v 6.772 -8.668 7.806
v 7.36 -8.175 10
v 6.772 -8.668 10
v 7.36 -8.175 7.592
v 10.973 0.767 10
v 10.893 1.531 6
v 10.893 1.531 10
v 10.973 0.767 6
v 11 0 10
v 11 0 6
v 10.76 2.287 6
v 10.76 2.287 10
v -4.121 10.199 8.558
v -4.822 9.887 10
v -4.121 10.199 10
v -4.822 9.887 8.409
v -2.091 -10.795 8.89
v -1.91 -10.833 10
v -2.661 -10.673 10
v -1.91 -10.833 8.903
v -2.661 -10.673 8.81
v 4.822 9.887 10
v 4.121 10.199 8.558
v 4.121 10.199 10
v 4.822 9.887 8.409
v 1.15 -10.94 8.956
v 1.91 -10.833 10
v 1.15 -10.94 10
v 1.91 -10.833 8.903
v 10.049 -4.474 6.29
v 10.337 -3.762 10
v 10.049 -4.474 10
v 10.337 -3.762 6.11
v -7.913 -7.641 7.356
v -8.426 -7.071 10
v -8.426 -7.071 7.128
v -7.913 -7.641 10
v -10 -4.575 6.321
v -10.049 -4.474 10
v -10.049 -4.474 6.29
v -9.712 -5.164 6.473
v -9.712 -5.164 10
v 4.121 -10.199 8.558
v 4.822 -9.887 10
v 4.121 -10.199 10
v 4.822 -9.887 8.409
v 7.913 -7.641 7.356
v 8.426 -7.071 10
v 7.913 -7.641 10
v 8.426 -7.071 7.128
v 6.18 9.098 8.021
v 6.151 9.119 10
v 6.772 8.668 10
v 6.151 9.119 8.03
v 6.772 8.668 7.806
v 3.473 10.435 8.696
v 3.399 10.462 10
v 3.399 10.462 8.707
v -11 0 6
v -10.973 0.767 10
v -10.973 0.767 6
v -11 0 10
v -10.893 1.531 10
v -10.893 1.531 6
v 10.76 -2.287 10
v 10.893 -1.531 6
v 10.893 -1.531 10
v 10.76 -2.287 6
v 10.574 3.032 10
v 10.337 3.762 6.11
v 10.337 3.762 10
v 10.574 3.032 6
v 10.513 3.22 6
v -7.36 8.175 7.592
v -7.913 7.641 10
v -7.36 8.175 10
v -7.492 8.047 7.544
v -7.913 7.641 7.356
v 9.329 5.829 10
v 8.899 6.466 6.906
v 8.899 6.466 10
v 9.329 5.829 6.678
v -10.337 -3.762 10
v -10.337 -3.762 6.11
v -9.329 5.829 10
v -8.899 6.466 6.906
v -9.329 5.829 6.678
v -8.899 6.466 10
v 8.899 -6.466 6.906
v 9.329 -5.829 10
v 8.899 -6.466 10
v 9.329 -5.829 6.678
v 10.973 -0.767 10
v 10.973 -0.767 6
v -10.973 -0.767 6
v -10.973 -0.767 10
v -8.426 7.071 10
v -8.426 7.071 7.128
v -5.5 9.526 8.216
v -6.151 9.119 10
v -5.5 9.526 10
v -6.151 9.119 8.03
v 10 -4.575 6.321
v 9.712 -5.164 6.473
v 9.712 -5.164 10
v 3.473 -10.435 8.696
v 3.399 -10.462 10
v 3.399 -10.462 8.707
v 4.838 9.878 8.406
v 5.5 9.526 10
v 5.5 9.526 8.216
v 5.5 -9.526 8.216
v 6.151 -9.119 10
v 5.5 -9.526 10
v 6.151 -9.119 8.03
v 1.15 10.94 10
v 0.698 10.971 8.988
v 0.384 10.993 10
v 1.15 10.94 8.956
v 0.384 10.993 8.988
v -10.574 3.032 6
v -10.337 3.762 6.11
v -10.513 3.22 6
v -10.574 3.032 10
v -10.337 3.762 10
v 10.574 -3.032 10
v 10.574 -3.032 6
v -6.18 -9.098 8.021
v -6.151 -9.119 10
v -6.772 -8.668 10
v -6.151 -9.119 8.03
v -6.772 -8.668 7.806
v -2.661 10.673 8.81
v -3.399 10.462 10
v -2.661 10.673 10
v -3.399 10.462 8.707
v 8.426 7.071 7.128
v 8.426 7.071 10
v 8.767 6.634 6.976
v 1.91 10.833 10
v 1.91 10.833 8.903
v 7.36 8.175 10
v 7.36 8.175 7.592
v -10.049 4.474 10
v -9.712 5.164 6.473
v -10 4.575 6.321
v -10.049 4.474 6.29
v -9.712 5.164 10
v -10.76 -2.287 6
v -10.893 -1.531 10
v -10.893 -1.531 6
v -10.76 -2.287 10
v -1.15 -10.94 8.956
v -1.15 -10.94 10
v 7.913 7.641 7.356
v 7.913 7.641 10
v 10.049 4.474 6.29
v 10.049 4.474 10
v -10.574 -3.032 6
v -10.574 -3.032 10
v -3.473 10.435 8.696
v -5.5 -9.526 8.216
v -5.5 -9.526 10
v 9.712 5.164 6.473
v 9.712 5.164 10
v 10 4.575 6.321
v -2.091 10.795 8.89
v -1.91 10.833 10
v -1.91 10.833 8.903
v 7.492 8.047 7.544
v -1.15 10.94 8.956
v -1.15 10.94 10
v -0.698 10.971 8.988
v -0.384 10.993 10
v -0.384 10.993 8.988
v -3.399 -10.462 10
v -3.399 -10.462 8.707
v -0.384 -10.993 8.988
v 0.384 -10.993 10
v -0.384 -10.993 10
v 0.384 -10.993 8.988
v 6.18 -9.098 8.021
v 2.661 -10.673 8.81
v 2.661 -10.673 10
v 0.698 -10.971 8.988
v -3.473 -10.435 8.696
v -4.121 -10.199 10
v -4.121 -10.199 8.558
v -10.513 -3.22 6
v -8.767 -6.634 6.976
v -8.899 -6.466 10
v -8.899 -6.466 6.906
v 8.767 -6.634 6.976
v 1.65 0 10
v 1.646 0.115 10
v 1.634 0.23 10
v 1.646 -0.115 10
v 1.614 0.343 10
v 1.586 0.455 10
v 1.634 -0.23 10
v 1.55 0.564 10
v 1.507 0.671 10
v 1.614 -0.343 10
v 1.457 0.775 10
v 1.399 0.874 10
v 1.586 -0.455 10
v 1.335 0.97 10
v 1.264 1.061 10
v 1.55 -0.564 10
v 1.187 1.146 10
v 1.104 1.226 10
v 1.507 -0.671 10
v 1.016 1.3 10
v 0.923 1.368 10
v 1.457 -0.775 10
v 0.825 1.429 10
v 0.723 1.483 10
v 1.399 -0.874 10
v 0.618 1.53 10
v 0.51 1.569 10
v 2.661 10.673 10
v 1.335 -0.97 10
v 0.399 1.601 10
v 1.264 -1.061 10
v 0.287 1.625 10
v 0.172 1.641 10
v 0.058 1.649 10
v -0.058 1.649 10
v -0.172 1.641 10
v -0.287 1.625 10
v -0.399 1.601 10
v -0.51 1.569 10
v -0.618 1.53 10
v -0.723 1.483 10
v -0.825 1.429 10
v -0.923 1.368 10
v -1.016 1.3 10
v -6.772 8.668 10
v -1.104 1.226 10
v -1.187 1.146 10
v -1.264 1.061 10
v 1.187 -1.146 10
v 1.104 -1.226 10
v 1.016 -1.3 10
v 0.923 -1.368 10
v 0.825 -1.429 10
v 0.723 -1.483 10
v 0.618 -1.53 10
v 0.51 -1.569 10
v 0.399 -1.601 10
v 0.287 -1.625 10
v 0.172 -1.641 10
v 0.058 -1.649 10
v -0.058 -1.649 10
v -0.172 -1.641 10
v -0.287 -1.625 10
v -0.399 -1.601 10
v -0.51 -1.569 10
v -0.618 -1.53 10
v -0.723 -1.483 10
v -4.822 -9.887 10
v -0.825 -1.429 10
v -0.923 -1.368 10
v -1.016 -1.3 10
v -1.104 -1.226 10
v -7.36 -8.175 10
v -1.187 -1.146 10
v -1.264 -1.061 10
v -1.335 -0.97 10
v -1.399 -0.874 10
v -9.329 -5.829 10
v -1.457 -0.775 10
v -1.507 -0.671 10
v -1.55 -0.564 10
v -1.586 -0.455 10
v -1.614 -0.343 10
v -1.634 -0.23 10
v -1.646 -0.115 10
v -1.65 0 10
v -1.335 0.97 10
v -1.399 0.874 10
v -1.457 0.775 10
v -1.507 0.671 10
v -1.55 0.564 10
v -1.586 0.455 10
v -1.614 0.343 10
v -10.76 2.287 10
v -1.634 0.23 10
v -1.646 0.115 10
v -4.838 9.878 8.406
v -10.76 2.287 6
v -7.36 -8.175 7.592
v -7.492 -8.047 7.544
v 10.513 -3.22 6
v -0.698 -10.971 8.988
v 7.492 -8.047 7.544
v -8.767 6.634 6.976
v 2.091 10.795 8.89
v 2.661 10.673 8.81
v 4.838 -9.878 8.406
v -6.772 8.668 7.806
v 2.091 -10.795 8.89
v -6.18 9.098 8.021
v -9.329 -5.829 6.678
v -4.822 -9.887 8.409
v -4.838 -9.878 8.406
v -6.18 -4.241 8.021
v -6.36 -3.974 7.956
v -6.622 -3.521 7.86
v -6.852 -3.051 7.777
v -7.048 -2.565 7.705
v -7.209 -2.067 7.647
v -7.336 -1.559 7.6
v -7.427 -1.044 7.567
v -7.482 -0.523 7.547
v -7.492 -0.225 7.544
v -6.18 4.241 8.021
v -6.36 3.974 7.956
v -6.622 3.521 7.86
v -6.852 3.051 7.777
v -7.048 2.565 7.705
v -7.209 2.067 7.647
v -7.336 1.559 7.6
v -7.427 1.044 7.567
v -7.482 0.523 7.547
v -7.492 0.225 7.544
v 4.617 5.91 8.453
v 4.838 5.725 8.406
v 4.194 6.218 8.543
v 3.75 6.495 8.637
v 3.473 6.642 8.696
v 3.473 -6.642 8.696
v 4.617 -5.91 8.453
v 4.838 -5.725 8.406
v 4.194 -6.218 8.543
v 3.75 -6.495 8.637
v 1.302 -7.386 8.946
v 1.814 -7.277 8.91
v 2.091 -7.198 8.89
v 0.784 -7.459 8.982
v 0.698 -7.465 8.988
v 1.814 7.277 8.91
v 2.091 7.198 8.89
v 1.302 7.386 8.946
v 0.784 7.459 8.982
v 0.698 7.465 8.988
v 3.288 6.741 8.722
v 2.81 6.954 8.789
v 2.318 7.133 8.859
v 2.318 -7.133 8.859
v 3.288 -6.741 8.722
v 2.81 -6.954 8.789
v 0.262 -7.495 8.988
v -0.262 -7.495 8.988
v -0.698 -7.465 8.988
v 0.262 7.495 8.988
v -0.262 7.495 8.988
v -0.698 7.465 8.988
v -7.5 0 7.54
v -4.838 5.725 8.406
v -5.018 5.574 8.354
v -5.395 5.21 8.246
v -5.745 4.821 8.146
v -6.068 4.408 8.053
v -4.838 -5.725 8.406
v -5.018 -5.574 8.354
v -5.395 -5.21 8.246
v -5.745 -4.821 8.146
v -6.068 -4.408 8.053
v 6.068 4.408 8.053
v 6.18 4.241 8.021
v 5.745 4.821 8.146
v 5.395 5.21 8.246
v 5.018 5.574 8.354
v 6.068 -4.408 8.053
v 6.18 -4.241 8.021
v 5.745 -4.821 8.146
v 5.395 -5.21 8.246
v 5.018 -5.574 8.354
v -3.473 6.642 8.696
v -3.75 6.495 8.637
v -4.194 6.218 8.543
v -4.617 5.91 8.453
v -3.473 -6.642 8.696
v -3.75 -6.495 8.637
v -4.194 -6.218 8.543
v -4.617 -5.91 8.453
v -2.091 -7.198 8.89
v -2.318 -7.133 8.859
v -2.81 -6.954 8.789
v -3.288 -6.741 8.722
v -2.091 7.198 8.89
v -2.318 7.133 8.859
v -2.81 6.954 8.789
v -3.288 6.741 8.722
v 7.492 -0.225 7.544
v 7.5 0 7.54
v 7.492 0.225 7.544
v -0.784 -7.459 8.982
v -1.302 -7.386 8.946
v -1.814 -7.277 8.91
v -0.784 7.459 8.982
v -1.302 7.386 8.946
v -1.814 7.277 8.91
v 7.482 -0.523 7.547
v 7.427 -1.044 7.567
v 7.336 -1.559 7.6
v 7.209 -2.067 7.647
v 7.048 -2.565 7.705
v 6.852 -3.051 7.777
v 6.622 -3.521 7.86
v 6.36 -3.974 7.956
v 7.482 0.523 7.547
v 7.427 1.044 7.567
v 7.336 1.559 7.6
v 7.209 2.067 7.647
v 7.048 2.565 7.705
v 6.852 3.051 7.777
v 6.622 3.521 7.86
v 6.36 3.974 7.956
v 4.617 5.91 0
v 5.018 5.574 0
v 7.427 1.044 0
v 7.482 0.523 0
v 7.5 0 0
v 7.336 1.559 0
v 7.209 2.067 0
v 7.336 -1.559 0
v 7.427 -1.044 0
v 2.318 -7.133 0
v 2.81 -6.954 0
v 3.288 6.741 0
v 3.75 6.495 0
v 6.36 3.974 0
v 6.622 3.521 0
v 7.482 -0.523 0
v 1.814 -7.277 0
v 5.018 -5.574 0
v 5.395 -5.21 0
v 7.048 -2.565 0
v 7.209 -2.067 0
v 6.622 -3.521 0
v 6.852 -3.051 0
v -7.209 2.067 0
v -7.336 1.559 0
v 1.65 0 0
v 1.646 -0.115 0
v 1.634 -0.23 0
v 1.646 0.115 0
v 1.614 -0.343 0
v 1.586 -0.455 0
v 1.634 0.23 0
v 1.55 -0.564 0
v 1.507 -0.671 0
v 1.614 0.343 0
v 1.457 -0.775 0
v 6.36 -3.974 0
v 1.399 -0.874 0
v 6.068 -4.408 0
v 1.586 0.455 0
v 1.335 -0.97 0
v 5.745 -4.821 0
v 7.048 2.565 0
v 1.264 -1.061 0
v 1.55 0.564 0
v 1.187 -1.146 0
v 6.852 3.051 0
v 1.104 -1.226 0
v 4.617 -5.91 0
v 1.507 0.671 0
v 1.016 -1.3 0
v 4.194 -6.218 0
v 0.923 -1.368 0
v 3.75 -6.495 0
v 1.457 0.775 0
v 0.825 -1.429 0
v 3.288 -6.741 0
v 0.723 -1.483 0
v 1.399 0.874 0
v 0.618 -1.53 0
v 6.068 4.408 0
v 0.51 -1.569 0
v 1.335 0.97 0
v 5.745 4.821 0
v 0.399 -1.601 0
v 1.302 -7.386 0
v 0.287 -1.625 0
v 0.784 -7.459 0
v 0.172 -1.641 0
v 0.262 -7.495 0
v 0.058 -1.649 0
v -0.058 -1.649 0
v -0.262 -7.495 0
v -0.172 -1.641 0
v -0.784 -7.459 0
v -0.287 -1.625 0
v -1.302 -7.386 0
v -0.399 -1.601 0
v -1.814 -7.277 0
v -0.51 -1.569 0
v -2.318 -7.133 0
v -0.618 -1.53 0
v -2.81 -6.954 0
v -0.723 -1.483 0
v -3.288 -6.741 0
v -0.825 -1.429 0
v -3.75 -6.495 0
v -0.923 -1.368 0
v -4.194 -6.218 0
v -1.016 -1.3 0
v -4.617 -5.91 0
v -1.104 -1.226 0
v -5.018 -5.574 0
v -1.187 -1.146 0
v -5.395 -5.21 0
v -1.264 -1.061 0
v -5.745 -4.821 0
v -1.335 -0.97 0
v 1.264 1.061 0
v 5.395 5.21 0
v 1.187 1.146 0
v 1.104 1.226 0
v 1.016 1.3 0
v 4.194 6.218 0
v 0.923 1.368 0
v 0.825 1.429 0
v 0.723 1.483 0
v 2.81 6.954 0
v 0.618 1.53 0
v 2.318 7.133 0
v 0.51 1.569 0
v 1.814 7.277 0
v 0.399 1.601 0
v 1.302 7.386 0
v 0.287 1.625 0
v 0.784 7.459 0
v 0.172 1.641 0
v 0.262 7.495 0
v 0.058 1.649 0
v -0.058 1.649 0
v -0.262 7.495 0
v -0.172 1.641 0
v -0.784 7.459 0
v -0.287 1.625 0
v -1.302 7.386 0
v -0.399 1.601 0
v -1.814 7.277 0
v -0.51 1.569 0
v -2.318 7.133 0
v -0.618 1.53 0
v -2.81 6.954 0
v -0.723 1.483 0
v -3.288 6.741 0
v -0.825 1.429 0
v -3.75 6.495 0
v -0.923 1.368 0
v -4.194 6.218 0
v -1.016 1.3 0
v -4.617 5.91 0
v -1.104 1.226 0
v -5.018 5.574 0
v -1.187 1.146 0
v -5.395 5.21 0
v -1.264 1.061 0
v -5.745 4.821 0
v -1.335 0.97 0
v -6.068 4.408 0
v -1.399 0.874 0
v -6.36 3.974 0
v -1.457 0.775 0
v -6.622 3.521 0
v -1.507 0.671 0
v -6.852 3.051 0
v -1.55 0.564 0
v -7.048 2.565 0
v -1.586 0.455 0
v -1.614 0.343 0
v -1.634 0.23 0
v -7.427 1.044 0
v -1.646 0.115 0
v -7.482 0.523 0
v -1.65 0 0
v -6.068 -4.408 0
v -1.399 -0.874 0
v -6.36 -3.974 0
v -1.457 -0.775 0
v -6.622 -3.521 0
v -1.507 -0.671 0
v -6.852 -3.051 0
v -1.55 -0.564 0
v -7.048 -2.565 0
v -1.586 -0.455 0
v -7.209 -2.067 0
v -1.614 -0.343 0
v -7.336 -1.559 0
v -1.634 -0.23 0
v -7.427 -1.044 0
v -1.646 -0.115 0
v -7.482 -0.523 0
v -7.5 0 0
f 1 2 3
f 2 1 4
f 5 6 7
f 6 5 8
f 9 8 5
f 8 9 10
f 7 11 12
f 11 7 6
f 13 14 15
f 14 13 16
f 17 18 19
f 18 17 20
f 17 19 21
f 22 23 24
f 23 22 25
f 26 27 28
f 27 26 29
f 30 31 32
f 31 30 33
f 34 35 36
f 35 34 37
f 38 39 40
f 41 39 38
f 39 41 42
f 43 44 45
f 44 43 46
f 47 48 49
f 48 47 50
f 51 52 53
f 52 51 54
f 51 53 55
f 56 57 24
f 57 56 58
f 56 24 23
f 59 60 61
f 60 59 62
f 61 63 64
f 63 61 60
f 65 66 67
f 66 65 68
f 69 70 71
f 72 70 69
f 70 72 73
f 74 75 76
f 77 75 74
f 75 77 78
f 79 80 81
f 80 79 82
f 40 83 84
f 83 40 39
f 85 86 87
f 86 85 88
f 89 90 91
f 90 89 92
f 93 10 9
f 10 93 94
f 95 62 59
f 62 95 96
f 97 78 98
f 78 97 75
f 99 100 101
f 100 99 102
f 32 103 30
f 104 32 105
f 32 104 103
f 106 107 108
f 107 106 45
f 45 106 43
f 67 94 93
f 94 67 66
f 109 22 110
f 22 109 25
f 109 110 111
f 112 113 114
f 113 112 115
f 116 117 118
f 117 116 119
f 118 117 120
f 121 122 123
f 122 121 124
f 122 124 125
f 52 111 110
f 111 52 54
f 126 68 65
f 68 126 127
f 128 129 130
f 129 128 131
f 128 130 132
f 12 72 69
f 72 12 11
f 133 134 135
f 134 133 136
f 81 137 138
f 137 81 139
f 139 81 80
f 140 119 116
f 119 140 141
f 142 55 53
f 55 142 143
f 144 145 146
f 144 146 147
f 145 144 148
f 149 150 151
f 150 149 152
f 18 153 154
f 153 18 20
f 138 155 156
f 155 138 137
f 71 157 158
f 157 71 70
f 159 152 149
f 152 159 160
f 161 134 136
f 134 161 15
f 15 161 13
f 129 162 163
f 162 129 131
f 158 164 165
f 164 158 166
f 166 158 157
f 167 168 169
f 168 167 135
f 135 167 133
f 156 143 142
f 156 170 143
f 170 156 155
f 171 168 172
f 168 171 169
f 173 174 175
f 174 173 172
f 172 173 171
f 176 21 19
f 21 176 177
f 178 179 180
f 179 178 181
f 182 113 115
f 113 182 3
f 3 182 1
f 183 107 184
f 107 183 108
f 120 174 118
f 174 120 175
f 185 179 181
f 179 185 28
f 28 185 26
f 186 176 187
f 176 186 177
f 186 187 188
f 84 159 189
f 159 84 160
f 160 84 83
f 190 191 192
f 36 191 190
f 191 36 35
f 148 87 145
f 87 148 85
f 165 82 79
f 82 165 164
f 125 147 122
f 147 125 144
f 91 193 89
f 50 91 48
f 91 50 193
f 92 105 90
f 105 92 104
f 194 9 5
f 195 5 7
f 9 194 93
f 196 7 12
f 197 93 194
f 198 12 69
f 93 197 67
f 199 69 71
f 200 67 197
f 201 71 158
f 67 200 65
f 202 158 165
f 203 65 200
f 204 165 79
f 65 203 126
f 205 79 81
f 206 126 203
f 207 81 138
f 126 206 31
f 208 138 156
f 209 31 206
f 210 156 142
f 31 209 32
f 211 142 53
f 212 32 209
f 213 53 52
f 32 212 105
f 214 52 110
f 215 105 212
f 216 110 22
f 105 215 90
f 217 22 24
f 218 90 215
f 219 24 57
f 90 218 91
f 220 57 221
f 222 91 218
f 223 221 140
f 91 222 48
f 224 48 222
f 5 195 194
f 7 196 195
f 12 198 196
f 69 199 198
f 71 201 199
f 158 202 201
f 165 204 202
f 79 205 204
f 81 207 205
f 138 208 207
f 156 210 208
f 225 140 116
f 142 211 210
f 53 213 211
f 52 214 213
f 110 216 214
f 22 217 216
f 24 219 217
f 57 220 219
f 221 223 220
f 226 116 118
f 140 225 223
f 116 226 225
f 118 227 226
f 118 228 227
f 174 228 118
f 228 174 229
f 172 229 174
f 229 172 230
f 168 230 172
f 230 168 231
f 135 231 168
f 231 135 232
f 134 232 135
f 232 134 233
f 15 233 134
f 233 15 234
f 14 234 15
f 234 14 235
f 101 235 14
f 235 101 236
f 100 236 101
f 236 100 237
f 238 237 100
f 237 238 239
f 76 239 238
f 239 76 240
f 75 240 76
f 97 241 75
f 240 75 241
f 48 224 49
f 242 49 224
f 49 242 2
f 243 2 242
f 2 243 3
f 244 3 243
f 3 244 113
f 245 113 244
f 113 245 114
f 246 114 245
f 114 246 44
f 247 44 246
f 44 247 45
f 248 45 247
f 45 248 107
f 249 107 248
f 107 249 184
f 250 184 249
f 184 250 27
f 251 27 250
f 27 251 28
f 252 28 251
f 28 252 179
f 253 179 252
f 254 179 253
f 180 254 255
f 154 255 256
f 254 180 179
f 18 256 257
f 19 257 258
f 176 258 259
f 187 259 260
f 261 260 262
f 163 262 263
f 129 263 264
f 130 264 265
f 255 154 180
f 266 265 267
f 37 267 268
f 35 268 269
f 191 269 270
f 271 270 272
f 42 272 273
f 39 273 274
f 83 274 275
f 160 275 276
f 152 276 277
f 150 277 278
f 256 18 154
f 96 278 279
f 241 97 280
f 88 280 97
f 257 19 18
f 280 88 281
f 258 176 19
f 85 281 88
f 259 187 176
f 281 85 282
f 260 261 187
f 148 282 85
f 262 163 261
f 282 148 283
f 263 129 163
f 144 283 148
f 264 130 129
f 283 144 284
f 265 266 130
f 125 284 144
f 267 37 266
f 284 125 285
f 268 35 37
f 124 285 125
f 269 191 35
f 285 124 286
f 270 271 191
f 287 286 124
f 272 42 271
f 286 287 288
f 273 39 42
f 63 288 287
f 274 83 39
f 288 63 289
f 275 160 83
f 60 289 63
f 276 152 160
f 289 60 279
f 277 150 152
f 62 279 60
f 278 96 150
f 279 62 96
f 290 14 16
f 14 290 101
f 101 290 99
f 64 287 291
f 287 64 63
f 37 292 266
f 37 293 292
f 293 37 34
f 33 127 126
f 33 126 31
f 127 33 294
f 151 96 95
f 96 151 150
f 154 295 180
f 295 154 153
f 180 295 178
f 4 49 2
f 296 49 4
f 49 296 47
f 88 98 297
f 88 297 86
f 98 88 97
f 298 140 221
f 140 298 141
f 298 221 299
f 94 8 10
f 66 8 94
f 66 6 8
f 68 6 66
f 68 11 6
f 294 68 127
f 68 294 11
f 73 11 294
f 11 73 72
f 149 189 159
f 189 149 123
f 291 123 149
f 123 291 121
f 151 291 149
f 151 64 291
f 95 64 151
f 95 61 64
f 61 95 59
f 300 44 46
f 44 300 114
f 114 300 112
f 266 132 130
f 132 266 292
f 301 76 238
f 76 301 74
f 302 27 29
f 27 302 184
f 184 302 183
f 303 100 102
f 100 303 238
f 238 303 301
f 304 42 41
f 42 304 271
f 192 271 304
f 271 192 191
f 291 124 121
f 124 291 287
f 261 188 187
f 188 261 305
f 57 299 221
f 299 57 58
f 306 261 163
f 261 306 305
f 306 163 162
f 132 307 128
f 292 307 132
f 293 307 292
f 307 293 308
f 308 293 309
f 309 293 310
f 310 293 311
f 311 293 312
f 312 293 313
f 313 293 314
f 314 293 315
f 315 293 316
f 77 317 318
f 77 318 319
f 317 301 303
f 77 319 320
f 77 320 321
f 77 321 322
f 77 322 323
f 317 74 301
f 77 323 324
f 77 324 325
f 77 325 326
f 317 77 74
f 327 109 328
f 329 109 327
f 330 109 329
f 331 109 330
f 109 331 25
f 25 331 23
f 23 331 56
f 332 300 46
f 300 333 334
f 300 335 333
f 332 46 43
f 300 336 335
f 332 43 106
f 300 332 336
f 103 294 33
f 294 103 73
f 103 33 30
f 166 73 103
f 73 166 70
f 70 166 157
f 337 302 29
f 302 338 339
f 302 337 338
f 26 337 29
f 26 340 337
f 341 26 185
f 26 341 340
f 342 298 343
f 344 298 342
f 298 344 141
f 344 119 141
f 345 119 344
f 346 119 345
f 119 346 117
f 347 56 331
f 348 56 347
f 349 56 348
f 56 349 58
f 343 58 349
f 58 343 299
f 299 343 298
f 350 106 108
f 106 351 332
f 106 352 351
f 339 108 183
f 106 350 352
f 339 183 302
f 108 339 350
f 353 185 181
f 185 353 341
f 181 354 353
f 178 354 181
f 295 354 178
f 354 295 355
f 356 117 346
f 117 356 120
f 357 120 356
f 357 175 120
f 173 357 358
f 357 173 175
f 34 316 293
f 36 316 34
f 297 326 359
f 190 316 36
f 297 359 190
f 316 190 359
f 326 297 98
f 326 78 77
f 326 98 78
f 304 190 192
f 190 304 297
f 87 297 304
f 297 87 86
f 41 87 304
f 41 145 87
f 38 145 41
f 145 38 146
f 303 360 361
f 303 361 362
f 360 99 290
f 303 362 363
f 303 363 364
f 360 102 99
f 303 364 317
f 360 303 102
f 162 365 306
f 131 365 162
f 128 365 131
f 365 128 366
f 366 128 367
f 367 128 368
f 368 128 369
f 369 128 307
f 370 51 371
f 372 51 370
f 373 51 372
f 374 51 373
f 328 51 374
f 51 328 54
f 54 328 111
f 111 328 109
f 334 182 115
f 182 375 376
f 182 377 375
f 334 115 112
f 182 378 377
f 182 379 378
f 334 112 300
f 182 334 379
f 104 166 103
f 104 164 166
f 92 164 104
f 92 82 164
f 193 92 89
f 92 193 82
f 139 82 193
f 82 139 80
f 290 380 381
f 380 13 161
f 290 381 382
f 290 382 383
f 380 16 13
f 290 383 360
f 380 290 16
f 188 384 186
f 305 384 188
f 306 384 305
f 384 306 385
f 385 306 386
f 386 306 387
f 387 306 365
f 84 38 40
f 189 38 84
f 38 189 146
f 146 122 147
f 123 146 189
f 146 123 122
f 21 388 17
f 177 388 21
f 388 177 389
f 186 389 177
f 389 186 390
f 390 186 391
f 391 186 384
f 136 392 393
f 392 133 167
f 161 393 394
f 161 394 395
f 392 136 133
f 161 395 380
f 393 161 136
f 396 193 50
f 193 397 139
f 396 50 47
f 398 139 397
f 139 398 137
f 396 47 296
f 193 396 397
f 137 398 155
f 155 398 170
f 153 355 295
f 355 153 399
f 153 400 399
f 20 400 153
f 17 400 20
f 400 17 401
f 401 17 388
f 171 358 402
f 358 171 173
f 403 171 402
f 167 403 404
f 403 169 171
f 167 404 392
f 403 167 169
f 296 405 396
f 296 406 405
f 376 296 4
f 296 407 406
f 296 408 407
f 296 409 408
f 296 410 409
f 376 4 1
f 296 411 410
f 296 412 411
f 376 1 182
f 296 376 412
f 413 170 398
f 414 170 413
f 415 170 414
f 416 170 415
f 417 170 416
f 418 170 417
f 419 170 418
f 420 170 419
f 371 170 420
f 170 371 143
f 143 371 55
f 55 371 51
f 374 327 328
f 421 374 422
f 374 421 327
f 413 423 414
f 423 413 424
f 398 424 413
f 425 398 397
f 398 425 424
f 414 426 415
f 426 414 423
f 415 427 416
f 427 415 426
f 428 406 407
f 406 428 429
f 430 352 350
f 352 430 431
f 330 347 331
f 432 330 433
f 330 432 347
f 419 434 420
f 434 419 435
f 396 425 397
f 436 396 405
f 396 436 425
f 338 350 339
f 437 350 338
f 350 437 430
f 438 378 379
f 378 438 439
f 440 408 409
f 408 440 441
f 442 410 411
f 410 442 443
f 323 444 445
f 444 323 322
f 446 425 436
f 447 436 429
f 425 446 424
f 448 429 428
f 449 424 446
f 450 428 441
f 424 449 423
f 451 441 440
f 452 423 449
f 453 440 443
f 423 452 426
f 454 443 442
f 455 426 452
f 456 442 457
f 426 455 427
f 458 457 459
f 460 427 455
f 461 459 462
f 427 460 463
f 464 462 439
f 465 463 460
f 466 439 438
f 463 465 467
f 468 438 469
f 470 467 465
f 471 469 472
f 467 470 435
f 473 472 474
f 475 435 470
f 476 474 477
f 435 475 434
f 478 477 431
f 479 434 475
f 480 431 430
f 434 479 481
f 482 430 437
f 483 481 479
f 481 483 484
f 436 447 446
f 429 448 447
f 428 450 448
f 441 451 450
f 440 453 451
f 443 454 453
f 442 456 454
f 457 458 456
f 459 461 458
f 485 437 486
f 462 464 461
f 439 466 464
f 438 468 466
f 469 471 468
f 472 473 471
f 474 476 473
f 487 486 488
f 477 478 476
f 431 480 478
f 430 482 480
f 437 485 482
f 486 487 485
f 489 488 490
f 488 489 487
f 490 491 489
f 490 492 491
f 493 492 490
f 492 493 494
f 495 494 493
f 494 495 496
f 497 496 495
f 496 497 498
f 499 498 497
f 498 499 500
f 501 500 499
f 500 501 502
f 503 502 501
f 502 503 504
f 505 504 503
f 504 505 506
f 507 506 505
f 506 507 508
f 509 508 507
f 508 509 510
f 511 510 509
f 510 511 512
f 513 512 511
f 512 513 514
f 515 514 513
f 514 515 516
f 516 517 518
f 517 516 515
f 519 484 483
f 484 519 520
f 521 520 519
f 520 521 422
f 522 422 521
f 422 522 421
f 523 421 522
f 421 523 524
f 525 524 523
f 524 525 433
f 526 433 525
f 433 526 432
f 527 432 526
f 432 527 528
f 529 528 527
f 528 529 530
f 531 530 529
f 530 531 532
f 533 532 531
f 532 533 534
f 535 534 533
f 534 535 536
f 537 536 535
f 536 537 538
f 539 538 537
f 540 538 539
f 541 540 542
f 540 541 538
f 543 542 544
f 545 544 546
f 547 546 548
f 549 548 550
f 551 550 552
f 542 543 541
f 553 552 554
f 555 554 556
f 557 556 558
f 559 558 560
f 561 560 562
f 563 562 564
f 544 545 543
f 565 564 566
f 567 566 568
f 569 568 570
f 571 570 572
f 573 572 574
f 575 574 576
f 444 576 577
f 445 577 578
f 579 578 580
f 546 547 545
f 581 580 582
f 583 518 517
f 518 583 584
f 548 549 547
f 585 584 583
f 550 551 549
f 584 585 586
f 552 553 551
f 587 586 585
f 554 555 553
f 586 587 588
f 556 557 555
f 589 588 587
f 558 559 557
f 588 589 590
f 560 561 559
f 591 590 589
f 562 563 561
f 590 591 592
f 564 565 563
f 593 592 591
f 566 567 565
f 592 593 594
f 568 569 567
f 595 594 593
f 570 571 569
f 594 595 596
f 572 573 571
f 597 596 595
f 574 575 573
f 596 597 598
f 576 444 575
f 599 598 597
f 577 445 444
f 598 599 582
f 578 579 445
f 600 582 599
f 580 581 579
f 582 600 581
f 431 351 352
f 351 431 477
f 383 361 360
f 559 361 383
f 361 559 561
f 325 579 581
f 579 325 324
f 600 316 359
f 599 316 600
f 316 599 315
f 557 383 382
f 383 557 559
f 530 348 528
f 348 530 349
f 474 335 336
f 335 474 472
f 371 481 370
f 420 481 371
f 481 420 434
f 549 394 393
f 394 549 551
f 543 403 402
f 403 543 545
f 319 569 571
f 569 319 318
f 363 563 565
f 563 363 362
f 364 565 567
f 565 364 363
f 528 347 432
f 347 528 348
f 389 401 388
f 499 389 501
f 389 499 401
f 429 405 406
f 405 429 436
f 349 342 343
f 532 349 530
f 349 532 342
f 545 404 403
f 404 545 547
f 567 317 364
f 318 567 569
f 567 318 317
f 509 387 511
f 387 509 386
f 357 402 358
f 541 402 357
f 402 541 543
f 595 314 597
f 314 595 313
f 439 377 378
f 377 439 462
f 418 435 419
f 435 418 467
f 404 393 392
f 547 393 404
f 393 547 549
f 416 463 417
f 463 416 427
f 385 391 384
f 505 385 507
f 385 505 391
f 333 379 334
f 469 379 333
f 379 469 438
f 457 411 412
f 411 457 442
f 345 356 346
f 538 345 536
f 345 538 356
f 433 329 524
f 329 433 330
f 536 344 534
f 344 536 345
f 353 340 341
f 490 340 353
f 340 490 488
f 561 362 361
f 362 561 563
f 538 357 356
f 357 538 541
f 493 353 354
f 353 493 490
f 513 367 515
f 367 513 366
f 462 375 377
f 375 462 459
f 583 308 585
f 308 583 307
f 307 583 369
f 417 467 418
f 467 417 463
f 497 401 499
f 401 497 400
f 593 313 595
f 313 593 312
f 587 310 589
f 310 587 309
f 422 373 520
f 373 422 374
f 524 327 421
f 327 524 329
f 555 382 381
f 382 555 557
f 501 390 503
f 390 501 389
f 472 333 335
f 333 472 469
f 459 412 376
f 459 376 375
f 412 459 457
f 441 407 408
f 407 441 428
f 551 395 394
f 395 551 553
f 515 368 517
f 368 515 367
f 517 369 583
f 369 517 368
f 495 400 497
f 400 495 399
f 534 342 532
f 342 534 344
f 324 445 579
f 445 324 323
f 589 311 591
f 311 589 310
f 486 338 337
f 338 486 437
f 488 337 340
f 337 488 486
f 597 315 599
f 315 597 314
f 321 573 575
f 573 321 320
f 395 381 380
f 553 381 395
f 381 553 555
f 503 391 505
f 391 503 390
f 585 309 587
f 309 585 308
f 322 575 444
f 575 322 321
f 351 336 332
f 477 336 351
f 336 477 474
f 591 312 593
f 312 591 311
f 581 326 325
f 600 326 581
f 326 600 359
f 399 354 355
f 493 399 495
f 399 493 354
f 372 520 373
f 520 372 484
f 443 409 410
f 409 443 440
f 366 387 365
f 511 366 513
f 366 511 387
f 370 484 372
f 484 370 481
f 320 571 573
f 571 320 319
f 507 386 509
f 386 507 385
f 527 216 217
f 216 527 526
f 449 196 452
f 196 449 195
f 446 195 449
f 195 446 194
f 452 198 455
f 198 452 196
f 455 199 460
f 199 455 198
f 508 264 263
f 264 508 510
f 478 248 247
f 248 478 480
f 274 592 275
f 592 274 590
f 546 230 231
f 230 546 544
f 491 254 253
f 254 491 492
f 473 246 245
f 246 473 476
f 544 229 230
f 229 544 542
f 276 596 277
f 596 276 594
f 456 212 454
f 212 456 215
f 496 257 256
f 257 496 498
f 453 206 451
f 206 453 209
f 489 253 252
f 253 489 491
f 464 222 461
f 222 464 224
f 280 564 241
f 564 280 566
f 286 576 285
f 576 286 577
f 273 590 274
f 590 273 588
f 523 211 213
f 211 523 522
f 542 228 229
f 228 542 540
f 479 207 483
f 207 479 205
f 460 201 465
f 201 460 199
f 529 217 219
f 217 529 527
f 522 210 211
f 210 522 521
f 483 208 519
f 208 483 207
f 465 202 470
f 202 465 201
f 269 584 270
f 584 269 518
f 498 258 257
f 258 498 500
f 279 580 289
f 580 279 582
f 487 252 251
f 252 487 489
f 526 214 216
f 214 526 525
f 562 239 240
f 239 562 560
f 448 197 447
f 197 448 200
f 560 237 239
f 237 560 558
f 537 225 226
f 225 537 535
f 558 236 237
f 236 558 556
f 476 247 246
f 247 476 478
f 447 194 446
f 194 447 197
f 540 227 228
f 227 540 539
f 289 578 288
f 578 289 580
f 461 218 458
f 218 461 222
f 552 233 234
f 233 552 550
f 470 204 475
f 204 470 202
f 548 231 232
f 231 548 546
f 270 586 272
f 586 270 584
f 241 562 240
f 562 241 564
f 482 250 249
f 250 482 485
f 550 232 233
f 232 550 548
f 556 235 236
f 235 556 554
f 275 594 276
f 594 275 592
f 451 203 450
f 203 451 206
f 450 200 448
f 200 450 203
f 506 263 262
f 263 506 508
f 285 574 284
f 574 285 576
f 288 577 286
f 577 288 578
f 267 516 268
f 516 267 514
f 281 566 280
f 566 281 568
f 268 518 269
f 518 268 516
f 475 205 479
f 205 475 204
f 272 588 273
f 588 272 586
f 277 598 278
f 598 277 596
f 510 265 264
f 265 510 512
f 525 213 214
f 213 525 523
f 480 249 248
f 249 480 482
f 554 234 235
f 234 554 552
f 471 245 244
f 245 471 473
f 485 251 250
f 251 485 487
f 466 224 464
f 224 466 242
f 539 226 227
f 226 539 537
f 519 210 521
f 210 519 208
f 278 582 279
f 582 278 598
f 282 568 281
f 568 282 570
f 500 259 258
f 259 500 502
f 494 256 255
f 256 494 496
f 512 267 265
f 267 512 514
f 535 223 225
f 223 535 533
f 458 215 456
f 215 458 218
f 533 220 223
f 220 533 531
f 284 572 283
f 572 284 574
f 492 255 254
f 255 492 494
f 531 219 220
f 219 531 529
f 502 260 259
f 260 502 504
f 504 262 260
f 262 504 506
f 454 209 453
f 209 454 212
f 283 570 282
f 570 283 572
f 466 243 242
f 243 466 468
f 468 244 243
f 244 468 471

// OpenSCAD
$fn = 90;

difference() {
    union() {
        cylinder(h=10, d=15);
        difference() {
            translate([0,0,6]) cylinder(h=4, d=22);
            translate([0,-20,-11]) rotate([-90,0,0]) cylinder(h=100, d=40);
        }
    }   
    cylinder(h=10, d=3.3);
}
